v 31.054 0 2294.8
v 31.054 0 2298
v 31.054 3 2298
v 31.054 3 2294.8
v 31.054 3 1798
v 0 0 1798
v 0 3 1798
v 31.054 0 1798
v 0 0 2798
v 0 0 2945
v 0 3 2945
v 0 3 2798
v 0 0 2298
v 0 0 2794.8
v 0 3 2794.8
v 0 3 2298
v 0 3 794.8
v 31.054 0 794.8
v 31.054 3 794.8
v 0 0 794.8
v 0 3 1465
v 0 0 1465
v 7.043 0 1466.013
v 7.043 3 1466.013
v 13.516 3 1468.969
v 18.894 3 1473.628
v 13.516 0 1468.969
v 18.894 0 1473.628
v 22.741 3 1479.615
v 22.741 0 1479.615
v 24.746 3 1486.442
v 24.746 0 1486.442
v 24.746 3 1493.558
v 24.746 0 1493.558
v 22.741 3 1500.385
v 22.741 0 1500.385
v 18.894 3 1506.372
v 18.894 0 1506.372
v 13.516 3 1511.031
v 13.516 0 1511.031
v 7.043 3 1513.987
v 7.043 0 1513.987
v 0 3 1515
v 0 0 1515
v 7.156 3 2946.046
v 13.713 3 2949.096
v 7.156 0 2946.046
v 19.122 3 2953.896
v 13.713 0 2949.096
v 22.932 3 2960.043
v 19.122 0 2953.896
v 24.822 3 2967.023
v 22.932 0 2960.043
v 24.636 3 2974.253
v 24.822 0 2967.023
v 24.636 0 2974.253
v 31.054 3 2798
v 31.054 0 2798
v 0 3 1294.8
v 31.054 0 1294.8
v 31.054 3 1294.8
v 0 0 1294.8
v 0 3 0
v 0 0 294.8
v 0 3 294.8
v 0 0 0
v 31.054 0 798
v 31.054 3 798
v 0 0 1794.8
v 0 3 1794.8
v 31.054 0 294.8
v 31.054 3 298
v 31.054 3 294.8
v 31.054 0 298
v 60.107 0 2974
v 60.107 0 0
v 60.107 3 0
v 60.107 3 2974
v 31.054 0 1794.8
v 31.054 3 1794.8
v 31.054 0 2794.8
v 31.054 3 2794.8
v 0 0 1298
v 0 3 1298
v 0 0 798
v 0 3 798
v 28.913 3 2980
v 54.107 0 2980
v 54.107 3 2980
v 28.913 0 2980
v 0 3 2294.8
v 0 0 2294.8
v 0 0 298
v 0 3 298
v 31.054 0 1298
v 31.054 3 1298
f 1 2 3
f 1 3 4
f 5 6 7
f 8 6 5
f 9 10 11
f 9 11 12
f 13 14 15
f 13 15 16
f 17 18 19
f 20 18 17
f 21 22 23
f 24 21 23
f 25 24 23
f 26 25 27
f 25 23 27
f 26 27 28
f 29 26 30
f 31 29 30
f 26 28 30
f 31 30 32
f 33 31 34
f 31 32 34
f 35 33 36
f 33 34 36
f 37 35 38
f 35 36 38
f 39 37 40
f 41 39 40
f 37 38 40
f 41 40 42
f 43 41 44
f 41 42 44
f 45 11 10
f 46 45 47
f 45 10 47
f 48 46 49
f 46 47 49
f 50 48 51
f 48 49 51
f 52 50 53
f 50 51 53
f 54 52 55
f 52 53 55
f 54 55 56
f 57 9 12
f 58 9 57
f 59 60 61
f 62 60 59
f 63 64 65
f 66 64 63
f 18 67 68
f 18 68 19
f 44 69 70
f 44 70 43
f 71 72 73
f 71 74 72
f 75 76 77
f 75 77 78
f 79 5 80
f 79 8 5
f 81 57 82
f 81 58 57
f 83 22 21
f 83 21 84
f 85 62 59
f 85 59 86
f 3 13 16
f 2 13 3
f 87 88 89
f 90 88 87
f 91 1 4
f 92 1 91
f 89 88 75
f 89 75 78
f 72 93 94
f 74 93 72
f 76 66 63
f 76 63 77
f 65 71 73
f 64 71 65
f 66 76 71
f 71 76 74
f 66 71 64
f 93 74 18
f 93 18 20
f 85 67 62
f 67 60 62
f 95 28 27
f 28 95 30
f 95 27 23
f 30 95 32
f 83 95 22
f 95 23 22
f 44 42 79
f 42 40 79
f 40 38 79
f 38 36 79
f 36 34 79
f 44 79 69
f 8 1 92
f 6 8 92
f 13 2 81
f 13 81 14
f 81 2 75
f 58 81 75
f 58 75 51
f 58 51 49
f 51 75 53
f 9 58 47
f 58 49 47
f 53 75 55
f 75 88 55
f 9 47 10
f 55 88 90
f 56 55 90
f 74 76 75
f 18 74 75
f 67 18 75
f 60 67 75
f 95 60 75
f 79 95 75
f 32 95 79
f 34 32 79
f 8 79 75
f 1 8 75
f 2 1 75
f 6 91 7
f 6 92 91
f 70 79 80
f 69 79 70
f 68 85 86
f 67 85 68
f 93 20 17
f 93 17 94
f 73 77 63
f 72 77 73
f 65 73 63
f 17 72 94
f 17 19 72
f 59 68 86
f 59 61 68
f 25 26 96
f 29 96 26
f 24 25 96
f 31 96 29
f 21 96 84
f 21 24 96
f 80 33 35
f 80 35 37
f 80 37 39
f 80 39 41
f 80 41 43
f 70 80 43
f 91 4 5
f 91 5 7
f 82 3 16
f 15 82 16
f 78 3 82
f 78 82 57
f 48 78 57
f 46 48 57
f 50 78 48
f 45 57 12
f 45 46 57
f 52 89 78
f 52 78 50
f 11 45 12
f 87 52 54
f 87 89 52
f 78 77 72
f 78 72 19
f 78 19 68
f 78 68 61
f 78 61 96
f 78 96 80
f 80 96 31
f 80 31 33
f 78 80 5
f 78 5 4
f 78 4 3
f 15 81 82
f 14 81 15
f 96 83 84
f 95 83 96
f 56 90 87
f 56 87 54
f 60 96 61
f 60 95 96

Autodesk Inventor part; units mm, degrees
ref_plane "YZ Plane" through (0, 0, 0) normal (1, 0, 0) x (0, 1, 0)
ref_plane "XZ Plane" through (0, 0, 0) normal (0, 1, 0) x (-1, 0, 0)
ref_plane "XY Plane" through (0, 0, 0) normal (0, 0, 1) x (1, 0, 0)
sketch "Sketch6" plane through (0, 0, 0) normal (0, 1, 0) x (-1, 0, 0)
  line L0 (0, 0) -> (-60.1073, 0)
  line L1 (-60.1073, 0) -> (-60.1073, 2980)
  line L2 (-60.1073, 2980) -> (0, 2980)
  line L3 (0, 2980) -> (0, 0)
  dimension "d26" = 60.1073
  dimension "d27" = 2980
extrude "Plate4" add sketch "Sketch6" along normal blind 3
sketch "Sketch9" plane through (0, 3, 0) normal (0, 1, 0) x (1, 0, 0)
  line L0 (0, -2980) -> (0, 0) projected
  line L1 (60.1073, -2980) -> (0, -2980) projected
  line L2 (60.1073, 0) -> (60.1073, -2980) projected
  line L3 (0, 0) -> (60.1073, 0) projected
  line L4 (25, -2762.0797) -> (10, -2762.0797) construction
  line L5 (10, -2762.0797) -> (10, -2562.0797) construction
  line L6 (10, -2562.0797) -> (25, -2562.0797) construction
  line L7 (25, -2562.0797) -> (25, -2762.0797) construction
  dimension "d44" = 200
  dimension "d45" = 15
  dimension "d47" = 10
mark "Mark1"
sketch "Sketch7" plane through (0, 0, 0) normal (0, -1, 0) x (1, 0, 0)
  line L0 (0, 2980) -> (60.1073, 2980) projected
  line L1 (0, 0) -> (0, 2980) projected
  line L2 (60.1073, 0) -> (0, 0) projected
  line L3 (60.1073, 2980) -> (60.1073, 0) projected
  line L4 (0, 2798) -> (31.0536, 2798)
  line L5 (31.0536, 2798) -> (31.0536, 2794.8)
  line L6 (31.0536, 2794.8) -> (0, 2794.8)
  line L7 (0, 2794.8) -> (0, 2798)
  point P0 (0, 2794.8)
  point P1 (0, 200)
  point P2 (46.4173, 200)
  point P3 (0, 2794.8)
  dimension "d29" = 31.0536
  dimension "d30" = 3.2
  dimension "d51" = 182
extrude "Extrusion2" cut sketch "Sketch7" against normal through all contours L4 L5 L6 L1
pattern_linear "Rectangular Pattern1" count 6 spacing 500 along (0, 0, -1) of "Extrusion2"
sketch "Sketch8" plane through (0, 0, 0) normal (0, -1, 0) x (1, 0, 0)
  line L0 (0, 2798) -> (31.0536, 2798) projected
  line L1 (31.0536, 2798) -> (31.0536, 2794.8) projected
  line L2 (31.0536, 2794.8) -> (0, 2794.8) projected
  line L3 (0, 0) -> (0, 294.8) projected
  line L4 (60.1073, 0) -> (0, 0) projected
  line L5 (60.1073, 2980) -> (60.1073, 0) projected
  line L6 (0, 2980) -> (60.1073, 2980) projected
  circle A0 centre (0, 1490) radius 25
  line L7 (0, 2798) -> (0, 2980) projected
  line L8 (0, 298) -> (31.0536, 298) projected
  line L9 (31.0536, 298) -> (31.0536, 294.8) projected
  line L10 (31.0536, 294.8) -> (0, 294.8) projected
  line L11 (0, 2298) -> (0, 2794.8) projected
  line L12 (0, 2298) -> (31.0536, 2298) projected
  line L13 (31.0536, 2298) -> (31.0536, 2294.8) projected
  line L14 (31.0536, 2294.8) -> (0, 2294.8) projected
  line L15 (0, 1798) -> (0, 2294.8) projected
  line L16 (0, 1798) -> (31.0536, 1798) projected
  line L17 (31.0536, 1798) -> (31.0536, 1794.8) projected
  line L18 (31.0536, 1794.8) -> (0, 1794.8) projected
  line L19 (0, 1298) -> (0, 1794.8) projected
  line L20 (0, 1298) -> (31.0536, 1298) projected
  line L21 (31.0536, 1298) -> (31.0536, 1294.8) projected
  line L22 (31.0536, 1294.8) -> (0, 1294.8) projected
  line L23 (0, 798) -> (0, 1294.8) projected
  line L24 (0, 798) -> (31.0536, 798) projected
  line L25 (31.0536, 798) -> (31.0536, 794.8) projected
  line L26 (31.0536, 794.8) -> (0, 794.8) projected
  line L27 (0, 298) -> (0, 794.8) projected
  dimension "d37" = 50
  dimension "d38" = 1490
extrude "Extrusion3" cut sketch "Sketch8" against normal through all contours L19 A0 | A0 L19
pattern_linear "Rectangular Pattern2" count 2 spacing 1480 along (0, 0, 1) of "Extrusion3"
chamfer "Corner Chamfer1" distance 6 angle 45 2 edges at (22.9129, 1.5, 2980) (60.1073, 1.5, 2980)
equation "\"d26\" = Stringer4_deep"
equation "\"d28\" = Thickness"
equation "\"BendReliefWidth\" = Thickness"
equation "\"BendReliefDepth\" = 0.5 * Thickness"
equation "\"CornerReliefSize\" = 4 * Thickness"
equation "\"MinimumRemnant\" = 2 * Thickness"
equation "\"TransitionRadius\" = BendRadius"
equation "\"JacobiRadiusSize\" = BendRadius"
equation "\"GapSize\" = Thickness"
equation "\"Stringer4_deep\" = 60.107271"
equation "\"Thickness\" = 3"
equation "\"BendRadius\" = 5"
properties part number "BSH 0361 stringer board 4" material "09g2s"
